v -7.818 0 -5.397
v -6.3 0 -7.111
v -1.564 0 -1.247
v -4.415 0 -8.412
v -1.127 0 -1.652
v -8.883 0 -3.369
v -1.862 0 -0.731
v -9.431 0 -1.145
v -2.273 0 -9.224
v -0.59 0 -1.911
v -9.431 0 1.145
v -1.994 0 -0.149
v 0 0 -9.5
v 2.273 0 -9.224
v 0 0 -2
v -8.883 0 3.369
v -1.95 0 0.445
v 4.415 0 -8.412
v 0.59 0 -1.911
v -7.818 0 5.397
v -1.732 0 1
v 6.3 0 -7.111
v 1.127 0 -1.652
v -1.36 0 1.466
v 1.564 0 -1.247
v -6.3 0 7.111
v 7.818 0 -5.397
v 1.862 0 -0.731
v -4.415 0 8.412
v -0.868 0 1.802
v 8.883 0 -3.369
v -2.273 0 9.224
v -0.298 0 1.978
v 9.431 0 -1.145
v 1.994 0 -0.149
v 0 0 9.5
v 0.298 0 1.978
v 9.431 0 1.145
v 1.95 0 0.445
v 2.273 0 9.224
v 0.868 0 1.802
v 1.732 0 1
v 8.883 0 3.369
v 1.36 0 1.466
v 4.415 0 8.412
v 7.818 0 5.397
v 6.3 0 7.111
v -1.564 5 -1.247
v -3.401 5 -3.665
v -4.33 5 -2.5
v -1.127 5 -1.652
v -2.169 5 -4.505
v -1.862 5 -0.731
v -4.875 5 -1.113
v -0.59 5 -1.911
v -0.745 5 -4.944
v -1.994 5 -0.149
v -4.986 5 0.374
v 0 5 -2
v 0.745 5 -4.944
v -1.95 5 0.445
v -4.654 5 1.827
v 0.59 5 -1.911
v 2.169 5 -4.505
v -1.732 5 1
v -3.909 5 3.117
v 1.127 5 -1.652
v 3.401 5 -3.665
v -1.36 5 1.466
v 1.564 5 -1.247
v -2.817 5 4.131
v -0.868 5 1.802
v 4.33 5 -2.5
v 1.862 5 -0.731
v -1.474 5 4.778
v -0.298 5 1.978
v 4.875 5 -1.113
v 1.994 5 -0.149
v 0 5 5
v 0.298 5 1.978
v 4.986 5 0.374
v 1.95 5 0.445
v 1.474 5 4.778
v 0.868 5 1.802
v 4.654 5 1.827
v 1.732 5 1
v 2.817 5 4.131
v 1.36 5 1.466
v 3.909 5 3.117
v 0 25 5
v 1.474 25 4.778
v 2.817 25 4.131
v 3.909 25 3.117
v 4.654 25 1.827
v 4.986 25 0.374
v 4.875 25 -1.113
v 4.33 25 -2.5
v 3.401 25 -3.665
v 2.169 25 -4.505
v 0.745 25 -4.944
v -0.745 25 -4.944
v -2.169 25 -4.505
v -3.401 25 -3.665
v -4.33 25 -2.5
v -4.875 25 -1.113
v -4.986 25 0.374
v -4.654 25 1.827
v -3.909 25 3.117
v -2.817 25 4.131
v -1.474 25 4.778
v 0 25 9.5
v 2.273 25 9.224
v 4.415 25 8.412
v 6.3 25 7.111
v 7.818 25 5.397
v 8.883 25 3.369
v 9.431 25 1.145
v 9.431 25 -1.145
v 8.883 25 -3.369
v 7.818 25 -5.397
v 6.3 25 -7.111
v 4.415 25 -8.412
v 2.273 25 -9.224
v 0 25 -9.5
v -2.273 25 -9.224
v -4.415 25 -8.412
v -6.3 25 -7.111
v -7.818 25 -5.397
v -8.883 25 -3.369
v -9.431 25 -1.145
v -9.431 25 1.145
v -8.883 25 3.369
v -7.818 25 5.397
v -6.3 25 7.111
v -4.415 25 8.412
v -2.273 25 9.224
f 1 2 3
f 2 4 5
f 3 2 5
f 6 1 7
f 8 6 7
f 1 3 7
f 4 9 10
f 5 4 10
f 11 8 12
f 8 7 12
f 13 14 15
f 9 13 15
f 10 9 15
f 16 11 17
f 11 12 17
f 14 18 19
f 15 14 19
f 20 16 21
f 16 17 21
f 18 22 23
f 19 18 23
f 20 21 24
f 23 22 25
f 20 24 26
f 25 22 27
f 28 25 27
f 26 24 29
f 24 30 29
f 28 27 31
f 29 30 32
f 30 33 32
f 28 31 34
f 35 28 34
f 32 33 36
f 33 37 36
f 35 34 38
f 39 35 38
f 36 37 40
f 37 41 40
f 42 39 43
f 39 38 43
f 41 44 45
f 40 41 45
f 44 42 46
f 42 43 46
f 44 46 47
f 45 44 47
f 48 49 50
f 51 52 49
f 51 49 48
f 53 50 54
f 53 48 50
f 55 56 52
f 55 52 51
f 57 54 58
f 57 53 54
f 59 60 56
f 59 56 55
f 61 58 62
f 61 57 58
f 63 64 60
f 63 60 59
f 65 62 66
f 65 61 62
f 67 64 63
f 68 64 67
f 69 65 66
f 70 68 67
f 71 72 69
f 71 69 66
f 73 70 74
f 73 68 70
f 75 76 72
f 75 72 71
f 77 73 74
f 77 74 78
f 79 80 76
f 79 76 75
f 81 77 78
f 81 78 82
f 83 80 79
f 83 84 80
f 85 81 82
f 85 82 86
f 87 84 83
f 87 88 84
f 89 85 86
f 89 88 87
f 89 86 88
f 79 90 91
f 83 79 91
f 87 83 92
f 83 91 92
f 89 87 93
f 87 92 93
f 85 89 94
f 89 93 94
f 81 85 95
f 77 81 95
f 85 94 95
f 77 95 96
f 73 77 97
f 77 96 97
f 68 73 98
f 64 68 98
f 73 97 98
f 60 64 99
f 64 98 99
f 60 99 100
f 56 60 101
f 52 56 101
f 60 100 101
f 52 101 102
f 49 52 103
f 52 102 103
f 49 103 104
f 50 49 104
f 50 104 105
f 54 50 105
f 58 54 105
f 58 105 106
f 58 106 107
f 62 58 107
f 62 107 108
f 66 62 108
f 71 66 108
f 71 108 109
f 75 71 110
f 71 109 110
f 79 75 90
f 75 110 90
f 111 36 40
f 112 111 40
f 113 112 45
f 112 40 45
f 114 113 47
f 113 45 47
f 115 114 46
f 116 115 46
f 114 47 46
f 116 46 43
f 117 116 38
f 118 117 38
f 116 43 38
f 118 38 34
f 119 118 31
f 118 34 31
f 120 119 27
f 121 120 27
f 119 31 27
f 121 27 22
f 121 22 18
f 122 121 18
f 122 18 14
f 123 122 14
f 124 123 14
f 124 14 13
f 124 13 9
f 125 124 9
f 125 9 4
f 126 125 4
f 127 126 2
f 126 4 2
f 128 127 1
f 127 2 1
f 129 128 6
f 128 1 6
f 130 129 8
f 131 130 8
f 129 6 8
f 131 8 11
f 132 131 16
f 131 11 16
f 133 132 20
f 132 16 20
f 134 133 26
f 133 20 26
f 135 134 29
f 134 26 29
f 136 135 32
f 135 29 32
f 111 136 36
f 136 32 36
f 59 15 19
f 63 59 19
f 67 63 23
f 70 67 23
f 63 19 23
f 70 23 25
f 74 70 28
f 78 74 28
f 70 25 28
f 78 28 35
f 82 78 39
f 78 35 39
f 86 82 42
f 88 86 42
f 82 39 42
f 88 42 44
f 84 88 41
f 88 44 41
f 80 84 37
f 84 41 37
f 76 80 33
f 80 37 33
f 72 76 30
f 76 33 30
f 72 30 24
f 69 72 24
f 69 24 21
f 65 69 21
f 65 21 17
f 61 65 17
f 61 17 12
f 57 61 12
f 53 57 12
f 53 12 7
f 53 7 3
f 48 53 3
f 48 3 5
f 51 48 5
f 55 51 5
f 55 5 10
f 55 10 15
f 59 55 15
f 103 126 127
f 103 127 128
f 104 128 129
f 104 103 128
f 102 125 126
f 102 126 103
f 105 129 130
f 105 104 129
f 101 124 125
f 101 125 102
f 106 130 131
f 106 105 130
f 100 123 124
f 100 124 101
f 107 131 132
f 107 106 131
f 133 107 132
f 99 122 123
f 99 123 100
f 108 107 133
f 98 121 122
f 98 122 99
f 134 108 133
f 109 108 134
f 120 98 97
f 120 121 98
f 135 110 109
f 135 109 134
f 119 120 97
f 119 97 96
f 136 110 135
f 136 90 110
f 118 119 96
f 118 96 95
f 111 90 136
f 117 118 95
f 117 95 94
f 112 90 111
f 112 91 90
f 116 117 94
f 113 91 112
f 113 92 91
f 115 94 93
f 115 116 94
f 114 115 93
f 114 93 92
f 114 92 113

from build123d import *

# Parameters (mm, degrees)
SKETCH1_R           = 9.5
BOSS_EXTRUDE1_DEPTH = 25
SKETCH2_R           = 5
CUT_EXTRUDE1_DEPTH  = 20
SKETCH3_R           = 2
CUT_EXTRUDE2_DEPTH  = 29.381331893


with BuildPart() as part:
    # Sketch1 → Boss-Extrude1 (new body)
    with BuildSketch(Plane(origin=(0, 0, 0), x_dir=(1, 0, 0), z_dir=(0, 1, 0))):
        with Locations(Location((0, 0, 0), (0, 0, 270))):
            Circle(SKETCH1_R)
    extrude(amount=BOSS_EXTRUDE1_DEPTH)

    # Sketch2 → Cut-Extrude1 (cut)
    with BuildSketch(Plane(origin=(0, 25, 0), x_dir=(1, 0, 0), z_dir=(0, 1, 0))):
        with Locations(Location((0, 0, 0), (0, 0, 270))):
            Circle(SKETCH2_R)
    extrude(amount=-CUT_EXTRUDE1_DEPTH, mode=Mode.SUBTRACT)

    # Sketch3 → Cut-Extrude2 (cut, through all)
    with BuildSketch(Plane.XZ):
        with Locations(Location((0, 0, 0), (0, 0, 270))):
            Circle(SKETCH3_R)
    extrude(amount=-CUT_EXTRUDE2_DEPTH, mode=Mode.SUBTRACT)


solid = part.part
